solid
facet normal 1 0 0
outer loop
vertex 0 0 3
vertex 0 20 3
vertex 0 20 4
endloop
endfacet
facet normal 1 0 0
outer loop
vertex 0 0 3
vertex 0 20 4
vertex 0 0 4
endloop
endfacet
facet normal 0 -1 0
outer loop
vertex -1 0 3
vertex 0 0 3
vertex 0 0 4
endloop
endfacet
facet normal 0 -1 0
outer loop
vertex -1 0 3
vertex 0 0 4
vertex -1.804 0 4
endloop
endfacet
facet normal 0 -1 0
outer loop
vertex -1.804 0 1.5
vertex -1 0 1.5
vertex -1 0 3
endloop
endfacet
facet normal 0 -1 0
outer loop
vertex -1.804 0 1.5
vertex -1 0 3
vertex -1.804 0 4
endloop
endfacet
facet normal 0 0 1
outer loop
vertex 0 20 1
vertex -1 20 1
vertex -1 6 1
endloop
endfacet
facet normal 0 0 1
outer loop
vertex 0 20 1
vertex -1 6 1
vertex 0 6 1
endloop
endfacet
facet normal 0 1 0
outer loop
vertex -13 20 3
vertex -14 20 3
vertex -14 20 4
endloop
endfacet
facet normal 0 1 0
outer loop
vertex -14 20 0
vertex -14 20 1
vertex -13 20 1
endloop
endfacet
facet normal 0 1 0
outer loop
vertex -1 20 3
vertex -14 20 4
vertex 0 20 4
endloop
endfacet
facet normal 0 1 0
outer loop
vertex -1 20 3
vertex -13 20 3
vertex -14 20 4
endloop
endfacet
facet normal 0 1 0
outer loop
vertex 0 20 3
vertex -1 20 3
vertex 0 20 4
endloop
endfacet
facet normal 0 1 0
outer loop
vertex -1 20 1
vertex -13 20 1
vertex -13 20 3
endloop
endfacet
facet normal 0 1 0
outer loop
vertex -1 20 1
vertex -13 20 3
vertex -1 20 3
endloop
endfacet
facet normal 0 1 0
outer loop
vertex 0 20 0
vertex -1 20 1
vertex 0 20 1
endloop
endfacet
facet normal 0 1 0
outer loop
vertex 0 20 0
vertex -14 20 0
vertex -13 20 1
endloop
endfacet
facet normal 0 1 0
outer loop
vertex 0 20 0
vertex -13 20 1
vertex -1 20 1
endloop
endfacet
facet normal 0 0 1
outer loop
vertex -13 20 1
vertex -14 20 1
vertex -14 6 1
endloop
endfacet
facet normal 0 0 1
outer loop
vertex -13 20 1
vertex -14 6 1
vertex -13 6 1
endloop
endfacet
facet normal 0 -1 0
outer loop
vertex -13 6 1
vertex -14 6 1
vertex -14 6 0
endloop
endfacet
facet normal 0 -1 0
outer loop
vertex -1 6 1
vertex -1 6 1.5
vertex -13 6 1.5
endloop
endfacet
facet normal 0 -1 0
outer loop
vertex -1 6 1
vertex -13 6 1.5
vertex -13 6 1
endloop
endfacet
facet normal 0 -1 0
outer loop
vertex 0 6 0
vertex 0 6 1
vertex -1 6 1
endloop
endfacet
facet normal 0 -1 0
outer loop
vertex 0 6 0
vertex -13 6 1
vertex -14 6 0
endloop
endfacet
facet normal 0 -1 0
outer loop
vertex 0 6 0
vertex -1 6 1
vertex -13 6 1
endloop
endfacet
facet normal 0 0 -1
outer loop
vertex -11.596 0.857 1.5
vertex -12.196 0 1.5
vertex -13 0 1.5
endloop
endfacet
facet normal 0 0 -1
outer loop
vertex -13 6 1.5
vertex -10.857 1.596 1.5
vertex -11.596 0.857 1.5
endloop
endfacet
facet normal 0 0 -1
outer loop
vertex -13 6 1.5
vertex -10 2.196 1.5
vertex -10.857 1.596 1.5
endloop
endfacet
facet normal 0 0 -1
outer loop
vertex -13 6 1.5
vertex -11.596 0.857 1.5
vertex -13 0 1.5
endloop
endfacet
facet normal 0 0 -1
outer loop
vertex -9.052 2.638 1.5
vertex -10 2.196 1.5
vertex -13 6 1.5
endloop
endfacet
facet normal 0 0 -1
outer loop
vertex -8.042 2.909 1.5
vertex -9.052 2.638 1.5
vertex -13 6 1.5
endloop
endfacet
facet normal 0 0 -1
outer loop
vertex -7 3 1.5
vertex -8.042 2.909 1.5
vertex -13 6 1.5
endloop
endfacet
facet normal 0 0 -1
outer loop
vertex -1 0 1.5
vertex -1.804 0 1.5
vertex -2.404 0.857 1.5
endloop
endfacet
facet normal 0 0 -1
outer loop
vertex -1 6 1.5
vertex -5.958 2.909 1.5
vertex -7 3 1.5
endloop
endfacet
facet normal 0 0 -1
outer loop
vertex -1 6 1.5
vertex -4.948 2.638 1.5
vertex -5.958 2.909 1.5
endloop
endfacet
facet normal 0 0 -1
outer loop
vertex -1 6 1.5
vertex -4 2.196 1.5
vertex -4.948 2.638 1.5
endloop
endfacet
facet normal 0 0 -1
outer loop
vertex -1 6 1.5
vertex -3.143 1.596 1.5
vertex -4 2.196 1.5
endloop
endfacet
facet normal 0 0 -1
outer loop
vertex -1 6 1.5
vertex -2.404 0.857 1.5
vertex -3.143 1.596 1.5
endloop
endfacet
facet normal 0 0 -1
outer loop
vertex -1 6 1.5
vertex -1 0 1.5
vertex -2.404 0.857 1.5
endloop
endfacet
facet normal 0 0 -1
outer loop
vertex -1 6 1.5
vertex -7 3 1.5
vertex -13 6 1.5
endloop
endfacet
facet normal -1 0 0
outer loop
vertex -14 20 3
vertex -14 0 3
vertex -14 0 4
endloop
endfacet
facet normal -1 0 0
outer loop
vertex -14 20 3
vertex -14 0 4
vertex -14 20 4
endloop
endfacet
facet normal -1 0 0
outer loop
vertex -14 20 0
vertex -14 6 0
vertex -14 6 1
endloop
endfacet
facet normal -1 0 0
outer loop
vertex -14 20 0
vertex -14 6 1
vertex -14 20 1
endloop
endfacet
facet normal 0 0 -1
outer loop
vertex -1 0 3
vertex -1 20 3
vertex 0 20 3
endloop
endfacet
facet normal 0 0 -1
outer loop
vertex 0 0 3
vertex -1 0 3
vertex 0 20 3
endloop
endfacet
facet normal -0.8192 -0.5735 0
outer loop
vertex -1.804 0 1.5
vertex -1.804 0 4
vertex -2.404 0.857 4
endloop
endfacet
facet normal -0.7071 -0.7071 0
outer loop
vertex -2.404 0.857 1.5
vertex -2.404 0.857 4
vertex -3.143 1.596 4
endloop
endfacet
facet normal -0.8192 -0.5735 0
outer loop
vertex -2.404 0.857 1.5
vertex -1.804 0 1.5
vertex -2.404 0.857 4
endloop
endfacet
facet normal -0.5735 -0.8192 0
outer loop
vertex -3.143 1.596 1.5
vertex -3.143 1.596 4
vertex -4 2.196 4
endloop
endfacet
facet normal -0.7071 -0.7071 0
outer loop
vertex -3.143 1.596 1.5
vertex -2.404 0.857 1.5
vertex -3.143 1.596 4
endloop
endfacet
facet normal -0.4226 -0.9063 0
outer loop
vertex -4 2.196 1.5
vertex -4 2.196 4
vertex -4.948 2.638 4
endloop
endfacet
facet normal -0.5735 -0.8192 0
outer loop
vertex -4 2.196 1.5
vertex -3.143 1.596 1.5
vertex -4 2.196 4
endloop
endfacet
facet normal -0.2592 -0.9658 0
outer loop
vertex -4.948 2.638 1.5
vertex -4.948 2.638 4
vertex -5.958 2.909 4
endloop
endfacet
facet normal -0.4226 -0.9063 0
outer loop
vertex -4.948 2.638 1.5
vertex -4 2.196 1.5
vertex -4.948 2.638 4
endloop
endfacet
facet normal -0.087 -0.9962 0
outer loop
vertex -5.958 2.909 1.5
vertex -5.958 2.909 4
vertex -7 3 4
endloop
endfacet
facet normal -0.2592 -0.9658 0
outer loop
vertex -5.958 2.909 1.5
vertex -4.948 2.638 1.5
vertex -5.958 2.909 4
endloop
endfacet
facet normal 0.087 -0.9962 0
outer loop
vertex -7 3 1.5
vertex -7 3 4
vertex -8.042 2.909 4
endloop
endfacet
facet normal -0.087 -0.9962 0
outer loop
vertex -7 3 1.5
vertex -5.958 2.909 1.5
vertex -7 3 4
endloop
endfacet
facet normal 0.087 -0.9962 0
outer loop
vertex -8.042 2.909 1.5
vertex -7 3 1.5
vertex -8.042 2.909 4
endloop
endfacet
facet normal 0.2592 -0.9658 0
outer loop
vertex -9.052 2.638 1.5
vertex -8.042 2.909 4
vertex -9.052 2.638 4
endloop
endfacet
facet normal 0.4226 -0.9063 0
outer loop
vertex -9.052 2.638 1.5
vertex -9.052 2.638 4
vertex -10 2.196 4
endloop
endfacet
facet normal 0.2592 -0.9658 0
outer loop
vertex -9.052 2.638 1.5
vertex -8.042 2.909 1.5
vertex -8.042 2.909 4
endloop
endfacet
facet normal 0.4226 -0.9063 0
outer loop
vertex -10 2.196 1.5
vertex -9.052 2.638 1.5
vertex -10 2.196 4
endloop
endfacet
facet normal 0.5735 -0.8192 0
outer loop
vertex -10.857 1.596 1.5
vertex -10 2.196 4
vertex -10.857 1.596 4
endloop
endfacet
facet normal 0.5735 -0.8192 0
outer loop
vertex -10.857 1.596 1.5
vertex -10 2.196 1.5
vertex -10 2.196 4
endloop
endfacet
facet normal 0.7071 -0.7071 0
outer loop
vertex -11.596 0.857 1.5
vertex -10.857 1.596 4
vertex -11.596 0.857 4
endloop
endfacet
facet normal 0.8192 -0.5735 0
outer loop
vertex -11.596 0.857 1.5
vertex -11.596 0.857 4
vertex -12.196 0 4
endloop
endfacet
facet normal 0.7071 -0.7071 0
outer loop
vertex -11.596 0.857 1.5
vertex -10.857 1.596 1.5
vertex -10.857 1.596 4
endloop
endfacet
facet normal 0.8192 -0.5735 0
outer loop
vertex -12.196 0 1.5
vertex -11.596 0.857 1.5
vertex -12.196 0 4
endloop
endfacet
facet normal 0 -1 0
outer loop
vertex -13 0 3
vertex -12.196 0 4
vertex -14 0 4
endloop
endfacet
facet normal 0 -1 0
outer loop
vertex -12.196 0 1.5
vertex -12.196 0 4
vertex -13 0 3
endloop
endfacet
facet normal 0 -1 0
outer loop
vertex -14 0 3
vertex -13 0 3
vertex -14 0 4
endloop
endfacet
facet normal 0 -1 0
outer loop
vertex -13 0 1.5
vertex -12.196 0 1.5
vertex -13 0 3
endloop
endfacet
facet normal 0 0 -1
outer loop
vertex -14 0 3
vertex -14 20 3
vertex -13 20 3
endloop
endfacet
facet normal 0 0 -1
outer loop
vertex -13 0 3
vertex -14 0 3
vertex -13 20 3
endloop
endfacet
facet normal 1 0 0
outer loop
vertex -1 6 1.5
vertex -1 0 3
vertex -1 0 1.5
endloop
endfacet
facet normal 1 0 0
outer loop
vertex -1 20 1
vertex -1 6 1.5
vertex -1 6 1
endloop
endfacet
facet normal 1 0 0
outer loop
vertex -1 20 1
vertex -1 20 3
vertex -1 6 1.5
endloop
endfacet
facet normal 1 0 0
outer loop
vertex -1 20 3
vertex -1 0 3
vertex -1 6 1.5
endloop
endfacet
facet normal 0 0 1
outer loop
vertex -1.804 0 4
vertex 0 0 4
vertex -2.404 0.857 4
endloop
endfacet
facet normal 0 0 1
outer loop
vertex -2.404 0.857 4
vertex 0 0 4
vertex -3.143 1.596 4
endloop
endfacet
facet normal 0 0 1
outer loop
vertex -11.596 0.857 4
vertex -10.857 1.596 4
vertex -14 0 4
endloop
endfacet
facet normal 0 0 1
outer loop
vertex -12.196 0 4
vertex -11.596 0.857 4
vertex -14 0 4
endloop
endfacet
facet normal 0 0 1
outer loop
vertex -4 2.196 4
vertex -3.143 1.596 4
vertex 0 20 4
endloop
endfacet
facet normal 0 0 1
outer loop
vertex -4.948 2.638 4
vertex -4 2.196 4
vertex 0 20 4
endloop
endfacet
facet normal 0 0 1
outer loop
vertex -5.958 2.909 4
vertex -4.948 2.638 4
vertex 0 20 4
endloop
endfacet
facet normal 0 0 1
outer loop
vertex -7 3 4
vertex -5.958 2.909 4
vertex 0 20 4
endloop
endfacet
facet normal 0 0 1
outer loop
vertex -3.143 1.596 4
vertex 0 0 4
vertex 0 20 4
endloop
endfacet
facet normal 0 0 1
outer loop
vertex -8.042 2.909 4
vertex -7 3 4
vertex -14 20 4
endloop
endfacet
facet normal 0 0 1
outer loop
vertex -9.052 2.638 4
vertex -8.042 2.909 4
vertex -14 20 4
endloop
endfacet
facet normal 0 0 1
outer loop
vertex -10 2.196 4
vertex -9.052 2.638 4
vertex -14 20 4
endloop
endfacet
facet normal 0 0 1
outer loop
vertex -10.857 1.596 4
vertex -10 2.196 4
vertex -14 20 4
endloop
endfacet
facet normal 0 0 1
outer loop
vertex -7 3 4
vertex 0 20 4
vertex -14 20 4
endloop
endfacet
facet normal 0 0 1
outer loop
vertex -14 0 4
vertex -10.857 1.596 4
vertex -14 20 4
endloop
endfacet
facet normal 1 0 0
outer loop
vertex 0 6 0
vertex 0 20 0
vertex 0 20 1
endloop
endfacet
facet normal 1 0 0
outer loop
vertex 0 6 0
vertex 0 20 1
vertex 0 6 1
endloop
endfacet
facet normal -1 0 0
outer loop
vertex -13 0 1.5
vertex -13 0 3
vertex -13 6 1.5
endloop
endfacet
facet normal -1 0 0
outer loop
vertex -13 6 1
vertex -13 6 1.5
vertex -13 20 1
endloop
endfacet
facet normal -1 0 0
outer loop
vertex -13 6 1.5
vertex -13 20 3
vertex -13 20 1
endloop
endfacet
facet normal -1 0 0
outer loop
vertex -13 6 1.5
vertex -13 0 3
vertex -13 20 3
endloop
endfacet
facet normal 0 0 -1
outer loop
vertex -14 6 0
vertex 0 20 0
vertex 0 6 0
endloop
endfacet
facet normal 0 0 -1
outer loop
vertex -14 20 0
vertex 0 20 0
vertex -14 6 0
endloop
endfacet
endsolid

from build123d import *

# Parameters (mm, degrees)
EXTRUDE_1_DEPTH          = 4
SKETCH_2_W               = 1.5
SKETCH_2_H               = 6
CUT_EXTRUDE_1_DEPTH      = 15
SKETCH_3_W               = 1
SKETCH_3_H               = 2
CUT_EXTRUDE_2_DEPTH      = 1
CUT_EXTRUDE_2_DEPTH_BACK = 21


with BuildPart() as part:
    # 草图1 → 凸台-拉伸1 (new body)
    with BuildSketch(Plane.XY):
        with BuildLine():
            Line((-14, 20), (0, 20))
            Line((0, 20), (0, 0))
            Line((0, 0), (-1.803847577, 0))
            ThreePointArc((-1.803847577, 0), (-7, 3), (-12.196152423, 0))
            Line((-12.196152423, 0), (-14, 0))
            Line((-14, 0), (-14, 20))
        make_face()
    extrude(amount=EXTRUDE_1_DEPTH)

    # 草图2 → 切除-拉伸1 (cut, through all)
    with BuildSketch(Plane(origin=(0, 0, 0), x_dir=(0, 0, -1), z_dir=(1, 0, 0))):
        with Locations((-0.75, 3)):
            Rectangle(SKETCH_2_W, SKETCH_2_H)
    extrude(amount=-CUT_EXTRUDE_1_DEPTH, mode=Mode.SUBTRACT)

    # 草图3 → 切除-拉伸2 (cut, two sides)
    with BuildSketch(Plane(origin=(0, 20, 0), x_dir=(1, 0, 0), z_dir=(0, 1, 0))) as cut_extrude_2_sk:
        with Locations((-0.5, -2)):
            Rectangle(SKETCH_3_W, SKETCH_3_H)
        with Locations((-13.5, -2)):
            Rectangle(SKETCH_3_W, SKETCH_3_H)
    extrude(amount=CUT_EXTRUDE_2_DEPTH, mode=Mode.SUBTRACT)
    extrude(cut_extrude_2_sk.sketch, amount=-CUT_EXTRUDE_2_DEPTH_BACK, mode=Mode.SUBTRACT)


solid = part.part
